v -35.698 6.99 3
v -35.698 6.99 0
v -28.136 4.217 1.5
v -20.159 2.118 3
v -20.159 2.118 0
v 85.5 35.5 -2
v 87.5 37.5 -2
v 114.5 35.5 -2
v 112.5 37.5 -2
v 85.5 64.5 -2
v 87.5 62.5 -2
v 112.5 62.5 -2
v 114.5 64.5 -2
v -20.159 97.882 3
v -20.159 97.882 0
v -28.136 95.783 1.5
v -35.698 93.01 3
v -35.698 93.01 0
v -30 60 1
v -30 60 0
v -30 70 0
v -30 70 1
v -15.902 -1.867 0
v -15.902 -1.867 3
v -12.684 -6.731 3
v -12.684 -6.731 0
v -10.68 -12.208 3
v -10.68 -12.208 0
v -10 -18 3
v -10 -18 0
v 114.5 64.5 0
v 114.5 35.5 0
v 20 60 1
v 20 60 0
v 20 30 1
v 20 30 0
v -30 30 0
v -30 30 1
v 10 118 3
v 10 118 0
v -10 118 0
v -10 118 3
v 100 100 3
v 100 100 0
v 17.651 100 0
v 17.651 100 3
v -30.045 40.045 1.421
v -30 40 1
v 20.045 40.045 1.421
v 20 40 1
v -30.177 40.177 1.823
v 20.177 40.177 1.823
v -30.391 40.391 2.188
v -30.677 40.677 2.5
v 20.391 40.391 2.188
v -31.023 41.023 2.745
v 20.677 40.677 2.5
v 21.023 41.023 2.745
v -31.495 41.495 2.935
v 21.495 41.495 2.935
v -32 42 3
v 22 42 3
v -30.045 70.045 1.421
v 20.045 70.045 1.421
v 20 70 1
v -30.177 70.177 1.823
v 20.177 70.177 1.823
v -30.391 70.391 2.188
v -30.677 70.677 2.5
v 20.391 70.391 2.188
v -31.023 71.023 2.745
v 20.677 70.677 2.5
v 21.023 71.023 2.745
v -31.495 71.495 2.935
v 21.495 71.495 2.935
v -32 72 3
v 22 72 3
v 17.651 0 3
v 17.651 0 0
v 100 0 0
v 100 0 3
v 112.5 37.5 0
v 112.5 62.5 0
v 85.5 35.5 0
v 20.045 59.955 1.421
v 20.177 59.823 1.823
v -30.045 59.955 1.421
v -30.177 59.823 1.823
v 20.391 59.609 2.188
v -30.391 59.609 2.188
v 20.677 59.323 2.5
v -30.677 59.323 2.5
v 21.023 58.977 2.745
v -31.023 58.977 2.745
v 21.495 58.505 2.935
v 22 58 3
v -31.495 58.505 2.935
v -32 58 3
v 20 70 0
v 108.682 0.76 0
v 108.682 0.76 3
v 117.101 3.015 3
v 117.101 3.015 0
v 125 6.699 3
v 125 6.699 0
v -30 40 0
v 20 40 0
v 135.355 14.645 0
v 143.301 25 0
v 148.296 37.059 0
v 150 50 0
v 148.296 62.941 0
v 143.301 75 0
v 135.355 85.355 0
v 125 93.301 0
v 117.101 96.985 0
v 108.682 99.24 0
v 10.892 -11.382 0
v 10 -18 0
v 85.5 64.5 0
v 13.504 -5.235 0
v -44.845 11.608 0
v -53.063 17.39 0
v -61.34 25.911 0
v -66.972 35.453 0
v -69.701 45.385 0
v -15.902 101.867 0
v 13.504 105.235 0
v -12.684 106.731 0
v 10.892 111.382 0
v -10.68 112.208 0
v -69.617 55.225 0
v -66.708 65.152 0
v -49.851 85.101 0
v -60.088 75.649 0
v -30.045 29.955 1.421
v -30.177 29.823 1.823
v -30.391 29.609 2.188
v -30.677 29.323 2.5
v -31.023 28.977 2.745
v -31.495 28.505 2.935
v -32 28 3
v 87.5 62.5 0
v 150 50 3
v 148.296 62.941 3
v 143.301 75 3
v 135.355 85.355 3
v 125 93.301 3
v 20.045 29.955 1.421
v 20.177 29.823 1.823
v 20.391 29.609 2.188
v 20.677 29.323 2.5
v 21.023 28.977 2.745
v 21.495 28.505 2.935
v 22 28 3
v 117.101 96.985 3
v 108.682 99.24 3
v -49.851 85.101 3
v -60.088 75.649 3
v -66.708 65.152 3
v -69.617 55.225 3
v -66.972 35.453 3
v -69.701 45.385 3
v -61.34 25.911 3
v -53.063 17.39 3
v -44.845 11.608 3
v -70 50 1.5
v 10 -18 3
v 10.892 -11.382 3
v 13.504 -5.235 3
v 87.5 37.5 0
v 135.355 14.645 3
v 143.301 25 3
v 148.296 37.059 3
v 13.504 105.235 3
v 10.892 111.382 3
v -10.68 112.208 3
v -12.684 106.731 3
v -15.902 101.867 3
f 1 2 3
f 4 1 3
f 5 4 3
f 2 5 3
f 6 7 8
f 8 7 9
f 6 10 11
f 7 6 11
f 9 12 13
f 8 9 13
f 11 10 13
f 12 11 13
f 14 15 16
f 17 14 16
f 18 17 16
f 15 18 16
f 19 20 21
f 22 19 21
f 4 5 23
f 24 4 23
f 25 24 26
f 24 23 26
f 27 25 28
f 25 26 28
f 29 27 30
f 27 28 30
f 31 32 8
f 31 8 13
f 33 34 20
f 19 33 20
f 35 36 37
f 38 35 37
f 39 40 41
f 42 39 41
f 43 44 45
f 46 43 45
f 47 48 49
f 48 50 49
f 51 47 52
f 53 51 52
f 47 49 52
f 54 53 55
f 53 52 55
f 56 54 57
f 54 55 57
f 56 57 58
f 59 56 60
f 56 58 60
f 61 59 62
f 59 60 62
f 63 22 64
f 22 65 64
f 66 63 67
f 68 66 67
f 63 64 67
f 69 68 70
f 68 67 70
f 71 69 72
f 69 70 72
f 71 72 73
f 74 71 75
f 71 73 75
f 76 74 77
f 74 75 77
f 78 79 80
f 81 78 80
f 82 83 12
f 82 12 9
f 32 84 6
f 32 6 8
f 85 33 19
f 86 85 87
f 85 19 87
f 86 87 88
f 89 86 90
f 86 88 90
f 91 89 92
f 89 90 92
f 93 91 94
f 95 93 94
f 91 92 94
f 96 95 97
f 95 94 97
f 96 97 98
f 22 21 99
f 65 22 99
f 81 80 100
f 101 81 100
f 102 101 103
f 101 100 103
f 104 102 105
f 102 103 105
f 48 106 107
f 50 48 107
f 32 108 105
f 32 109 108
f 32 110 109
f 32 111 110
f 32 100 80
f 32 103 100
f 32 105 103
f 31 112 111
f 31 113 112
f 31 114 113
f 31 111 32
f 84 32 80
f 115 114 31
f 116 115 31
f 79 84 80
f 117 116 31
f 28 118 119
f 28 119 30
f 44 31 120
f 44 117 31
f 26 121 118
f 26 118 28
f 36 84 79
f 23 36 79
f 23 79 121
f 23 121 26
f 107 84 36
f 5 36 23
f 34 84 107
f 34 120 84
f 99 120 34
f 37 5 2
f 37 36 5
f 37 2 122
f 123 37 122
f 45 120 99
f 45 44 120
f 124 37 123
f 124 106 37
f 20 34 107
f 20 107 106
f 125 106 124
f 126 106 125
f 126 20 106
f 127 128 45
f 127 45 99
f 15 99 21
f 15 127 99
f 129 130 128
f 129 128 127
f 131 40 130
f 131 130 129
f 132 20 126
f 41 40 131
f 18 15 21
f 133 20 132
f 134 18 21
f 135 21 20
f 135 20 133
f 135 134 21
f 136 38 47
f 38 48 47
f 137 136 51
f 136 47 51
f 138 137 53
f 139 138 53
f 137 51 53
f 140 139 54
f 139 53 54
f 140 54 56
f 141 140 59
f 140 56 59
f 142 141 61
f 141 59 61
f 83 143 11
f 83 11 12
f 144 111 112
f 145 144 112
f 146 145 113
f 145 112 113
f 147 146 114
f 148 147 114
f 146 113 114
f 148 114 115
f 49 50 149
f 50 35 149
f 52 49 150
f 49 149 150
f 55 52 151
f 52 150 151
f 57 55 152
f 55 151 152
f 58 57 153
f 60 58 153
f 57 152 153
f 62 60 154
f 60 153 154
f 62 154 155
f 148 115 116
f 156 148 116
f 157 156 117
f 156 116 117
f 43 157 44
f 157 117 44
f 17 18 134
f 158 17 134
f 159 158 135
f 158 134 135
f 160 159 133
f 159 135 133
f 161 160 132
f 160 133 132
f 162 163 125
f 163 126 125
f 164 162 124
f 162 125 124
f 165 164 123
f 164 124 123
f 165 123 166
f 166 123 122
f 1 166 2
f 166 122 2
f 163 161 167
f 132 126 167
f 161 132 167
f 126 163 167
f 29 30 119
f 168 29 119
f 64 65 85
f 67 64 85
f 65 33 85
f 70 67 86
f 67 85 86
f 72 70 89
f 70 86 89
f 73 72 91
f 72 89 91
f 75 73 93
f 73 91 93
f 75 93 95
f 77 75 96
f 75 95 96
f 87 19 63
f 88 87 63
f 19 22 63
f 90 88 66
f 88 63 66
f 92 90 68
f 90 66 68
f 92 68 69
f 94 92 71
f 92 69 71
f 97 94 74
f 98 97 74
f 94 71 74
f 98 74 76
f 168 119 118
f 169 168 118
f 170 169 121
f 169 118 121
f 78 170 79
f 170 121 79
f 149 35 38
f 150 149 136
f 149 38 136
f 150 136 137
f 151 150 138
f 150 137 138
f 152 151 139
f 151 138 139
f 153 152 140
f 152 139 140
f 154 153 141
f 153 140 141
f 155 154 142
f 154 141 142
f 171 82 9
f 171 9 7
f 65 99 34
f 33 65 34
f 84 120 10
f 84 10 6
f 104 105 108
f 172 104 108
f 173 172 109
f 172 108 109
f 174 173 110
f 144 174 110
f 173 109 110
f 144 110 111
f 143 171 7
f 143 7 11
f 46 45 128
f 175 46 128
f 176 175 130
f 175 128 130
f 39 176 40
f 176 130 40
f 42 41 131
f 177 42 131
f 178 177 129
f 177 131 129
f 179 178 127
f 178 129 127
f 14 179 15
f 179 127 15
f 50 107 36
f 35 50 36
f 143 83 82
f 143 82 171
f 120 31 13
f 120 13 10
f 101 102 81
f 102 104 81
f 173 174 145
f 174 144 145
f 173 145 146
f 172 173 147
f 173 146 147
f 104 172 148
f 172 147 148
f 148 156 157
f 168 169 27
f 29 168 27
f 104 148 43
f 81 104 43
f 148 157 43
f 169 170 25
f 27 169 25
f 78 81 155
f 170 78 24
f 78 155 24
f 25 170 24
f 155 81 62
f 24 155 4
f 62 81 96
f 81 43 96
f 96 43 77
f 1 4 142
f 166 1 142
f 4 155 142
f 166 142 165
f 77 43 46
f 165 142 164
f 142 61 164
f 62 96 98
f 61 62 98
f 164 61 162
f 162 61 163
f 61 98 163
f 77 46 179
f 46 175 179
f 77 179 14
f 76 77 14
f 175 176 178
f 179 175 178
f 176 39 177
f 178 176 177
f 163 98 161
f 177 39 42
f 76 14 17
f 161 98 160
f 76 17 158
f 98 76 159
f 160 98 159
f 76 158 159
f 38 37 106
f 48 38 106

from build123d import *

# Parameters (mm, degrees)
F1_DEPTH = 3
F2_R     = 2
F3_DEPTH = 2


with BuildPart() as f1:
    # F0 (on Top) → F1 (new body)
    with BuildSketch(Plane.XY):
        with BuildLine():
            add(Edge.make_bspline(
                [(0, 0), (10.2976274735, 0), (20.158993222, 2.1182632902)],
                knots=[1.5707963268, 1.5707963268, 1.5707963268, 1.8629189995, 1.8629189995, 1.8629189995], degree=2, weights=[1, 0.9893519935, 1]))
            Line((0, 0), (17.6506484271, 0))
            ThreePointArc((17.6506484271, 0), (18.8700107709, 1.1003520247), (20.158993222, 2.1182632902))
        make_face()
        with BuildLine():
            add(Edge.make_bspline(
                [(-20.158993222, 2.1182632902), (-10.2976274735, 0), (0, 0)],
                knots=[1.2786736541, 1.2786736541, 1.2786736541, 1.5707963268, 1.5707963268, 1.5707963268], degree=2, weights=[1, 0.9893519935, 1]))
            Line((0, 0), (0, 30))
            Line((0, 30), (-10, 30))
            Line((-10, 30), (-30, 30))
            Line((-30, 30), (-30, 40))
            Line((-30, 40), (-10, 40))
            Line((-10, 40), (0, 40))
            Line((0, 40), (0, 50))
            Line((0, 50), (-70, 50))
            add(Edge.make_bspline(
                [(-70, 50), (-70, 21.516086051), (-35.6976035326, 6.9902650909)],
                knots=[0, 0, 0, 1.0356513364, 1.0356513364, 1.0356513364], degree=2, weights=[1, 0.8688975097, 1]))
            ThreePointArc((-35.6976035326, 6.9902650909), (-27.5204903752, 5.8549142898), (-20.158993222, 2.1182632902))
        make_face()
        with BuildLine():
            Line((0, -18), (0, 0))
            add(Edge.make_bspline(
                [(-20.158993222, 2.1182632902), (-10.2976274735, 0), (0, 0)],
                knots=[1.2786736541, 1.2786736541, 1.2786736541, 1.5707963268, 1.5707963268, 1.5707963268], degree=2, weights=[1, 0.9893519935, 1]))
            ThreePointArc((-20.158993222, 2.1182632902), (-12.6838044298, -6.7311307011), (-10, -18))
            Line((-10, -18), (0, -18))
        make_face()
        with BuildLine():
            Line((0, 30), (0, 0))
            add(Edge.make_bspline(
                [(0, 0), (10.2976274735, 0), (20.158993222, 2.1182632902)],
                knots=[1.5707963268, 1.5707963268, 1.5707963268, 1.8629189995, 1.8629189995, 1.8629189995], degree=2, weights=[1, 0.9893519935, 1]))
            ThreePointArc((20.158993222, 2.1182632902), (27.5204903752, 5.8549142898), (35.6976035326, 6.9902650909))
            add(Edge.make_bspline(
                [(35.6976035326, 6.9902650909), (49.4779363229, 12.8257362969), (58.3333333333, 22.3614600804)],
                knots=[2.1059413172, 2.1059413172, 2.1059413172, 2.5559071101, 2.5559071101, 2.5559071101], degree=2, weights=[1, 0.9747979228, 1]))
            ThreePointArc((58.3333333333, 22.3614600804), (52.1286446122, 35.5662432703), (50, 50))
            Line((50, 50), (0, 50))
            Line((0, 50), (0, 40))
            Line((0, 40), (20, 40))
            Line((20, 40), (20, 30))
            Line((20, 30), (0, 30))
        make_face()
        with BuildLine():
            Line((17.6506484271, 0), (0, 0))
            Line((0, 0), (0, -18))
            Line((0, -18), (10, -18))
            ThreePointArc((10, -18), (11.9920254116, -8.2207819669), (17.6506484271, 0))
        make_face()
        with BuildLine():
            ThreePointArc((20.158993222, 2.1182632902), (18.8700107709, 1.1003520247), (17.6506484271, 0))
            Line((17.6506484271, 0), (52.3493515729, 0))
            ThreePointArc((52.3493515729, 0), (44.67672975, 5.0512668056), (35.6976035326, 6.9902650909))
            add(Edge.make_bspline(
                [(20.158993222, 2.1182632902), (28.3447518468, 3.8765990461), (35.6976035326, 6.9902650909)],
                knots=[1.8629189995, 1.8629189995, 1.8629189995, 2.1059413172, 2.1059413172, 2.1059413172], degree=2, weights=[1, 0.9926265982, 1]))
        make_face()
        with BuildLine():
            add(Edge.make_bspline(
                [(-35.6976035326, 6.9902650909), (-28.3447518468, 3.8765990461), (-20.158993222, 2.1182632902)],
                knots=[1.0356513364, 1.0356513364, 1.0356513364, 1.2786736541, 1.2786736541, 1.2786736541], degree=2, weights=[1, 0.9926265982, 1]))
            ThreePointArc((-20.158993222, 2.1182632902), (-27.5204903752, 5.8549142898), (-35.6976035326, 6.9902650909))
        make_face()
        with BuildLine():
            ThreePointArc((35.6976035326, 6.9902650909), (27.5204903752, 5.8549142898), (20.158993222, 2.1182632902))
            add(Edge.make_bspline(
                [(20.158993222, 2.1182632902), (28.3447518468, 3.8765990461), (35.6976035326, 6.9902650909)],
                knots=[1.8629189995, 1.8629189995, 1.8629189995, 2.1059413172, 2.1059413172, 2.1059413172], degree=2, weights=[1, 0.9926265982, 1]))
        make_face()
        with BuildLine():
            ThreePointArc((35.6976035326, 6.9902650909), (44.67672975, 5.0512668056), (52.3493515729, 0))
            Line((52.3493515729, 0), (100, 0))
            ThreePointArc((100, 0), (76.3560472423, 5.9436327191), (58.3333333333, 22.3614600804))
            add(Edge.make_bspline(
                [(35.6976035326, 6.9902650909), (49.4779363229, 12.8257362969), (58.3333333333, 22.3614600804)],
                knots=[2.1059413172, 2.1059413172, 2.1059413172, 2.5559071101, 2.5559071101, 2.5559071101], degree=2, weights=[1, 0.9747979228, 1]))
        make_face()
        with BuildLine():
            ThreePointArc((58.3333333333, 22.3614600804), (76.3560472423, 5.9436327191), (100, 0))
            ThreePointArc((100, 0), (112.9409522551, 1.7037086855), (125, 6.6987298108))
            ThreePointArc((125, 6.6987298108), (110.8310397827, 18.9227968521), (102.1486677301, 35.5))
            Line((102.1486677301, 35.5), (85.5, 35.5))
            Line((85.5, 35.5), (85.5, 50))
            Line((85.5, 50), (70, 50))
            add(Edge.make_bspline(
                [(58.3333333333, 22.3614600804), (70, 34.9244327711), (70, 50)],
                knots=[2.5559071101, 2.5559071101, 2.5559071101, 3.1415926536, 3.1415926536, 3.1415926536], degree=2, weights=[1, 0.9574271078, 1]))
        make_face()
        with BuildLine():
            add(Edge.make_bspline(
                [(-35.6976035326, 93.0097349091), (-70, 78.483913949), (-70, 50)],
                knots=[5.2475339708, 5.2475339708, 5.2475339708, 6.2831853072, 6.2831853072, 6.2831853072], degree=2, weights=[1, 0.8688975097, 1]))
            Line((-70, 50), (0, 50))
            Line((0, 50), (0, 60))
            Line((0, 60), (-10, 60))
            Line((-10, 60), (-30, 60))
            Line((-30, 60), (-30, 70))
            Line((-30, 70), (-10, 70))
            Line((-10, 70), (0, 70))
            Line((0, 70), (0, 100))
            add(Edge.make_bspline(
                [(0, 100), (-10.2976274735, 100), (-20.158993222, 97.8817367098)],
                knots=[4.7123889804, 4.7123889804, 4.7123889804, 5.0045116531, 5.0045116531, 5.0045116531], degree=2, weights=[1, 0.9893519935, 1]))
            add(Edge.make_bspline(
                [(-20.158993222, 97.8817367098), (-28.3447518468, 96.1234009539), (-35.6976035326, 93.0097349091)],
                knots=[5.0045116531, 5.0045116531, 5.0045116531, 5.2475339708, 5.2475339708, 5.2475339708], degree=2, weights=[1, 0.9926265982, 1]))
        make_face()
        with BuildLine():
            ThreePointArc((50, 50), (52.1286446122, 35.5662432703), (58.3333333333, 22.3614600804))
            add(Edge.make_bspline(
                [(58.3333333333, 22.3614600804), (70, 34.9244327711), (70, 50)],
                knots=[2.5559071101, 2.5559071101, 2.5559071101, 3.1415926536, 3.1415926536, 3.1415926536], degree=2, weights=[1, 0.9574271078, 1]))
            Line((70, 50), (50, 50))
        make_face()
        with BuildLine():
            ThreePointArc((102.1486677301, 35.5), (110.8310397827, 18.9227968521), (125, 6.6987298108))
            ThreePointArc((125, 6.6987298108), (143.3012701892, 25), (150, 50))
            Line((150, 50), (114.5, 50))
            Line((114.5, 50), (114.5, 35.5))
            Line((114.5, 35.5), (102.1486677301, 35.5))
        make_face()
        with BuildLine():
            Line((0, 60), (0, 50))
            Line((0, 50), (50, 50))
            ThreePointArc((50, 50), (52.1286446122, 64.4337567297), (58.3333333333, 77.6385399196))
            add(Edge.make_bspline(
                [(58.3333333333, 77.6385399196), (49.4779363229, 87.1742637031), (35.6976035326, 93.0097349091)],
                knots=[3.727278197, 3.727278197, 3.727278197, 4.17724399, 4.17724399, 4.17724399], degree=2, weights=[1, 0.9747979228, 1]))
            ThreePointArc((35.6976035326, 93.0097349091), (27.5204903752, 94.1450857102), (20.158993222, 97.8817367098))
            add(Edge.make_bspline(
                [(20.158993222, 97.8817367098), (10.2976274735, 100), (0, 100)],
                knots=[4.4202663077, 4.4202663077, 4.4202663077, 4.7123889804, 4.7123889804, 4.7123889804], degree=2, weights=[1, 0.9893519935, 1]))
            Line((0, 100), (0, 70))
            Line((0, 70), (20, 70))
            Line((20, 70), (20, 60))
            Line((20, 60), (0, 60))
        make_face()
        with BuildLine():
            Line((50, 50), (70, 50))
            add(Edge.make_bspline(
                [(70, 50), (70, 65.0755672289), (58.3333333333, 77.6385399196)],
                knots=[3.1415926536, 3.1415926536, 3.1415926536, 3.727278197, 3.727278197, 3.727278197], degree=2, weights=[1, 0.9574271078, 1]))
            ThreePointArc((58.3333333333, 77.6385399196), (52.1286446122, 64.4337567297), (50, 50))
        make_face()
        with BuildLine():
            add(Edge.make_bspline(
                [(70, 50), (70, 65.0755672289), (58.3333333333, 77.6385399196)],
                knots=[3.1415926536, 3.1415926536, 3.1415926536, 3.727278197, 3.727278197, 3.727278197], degree=2, weights=[1, 0.9574271078, 1]))
            Line((70, 50), (85.5, 50))
            Line((85.5, 50), (85.5, 64.5))
            Line((85.5, 64.5), (102.1486677301, 64.5))
            ThreePointArc((102.1486677301, 64.5), (110.8310397827, 81.0772031479), (125, 93.3012701892))
            ThreePointArc((125, 93.3012701892), (112.9409522551, 98.2962913145), (100, 100))
            ThreePointArc((100, 100), (76.3560472423, 94.0563672809), (58.3333333333, 77.6385399196))
        make_face()
        with BuildLine():
            Line((85.5, 35.5), (102.1486677301, 35.5))
            ThreePointArc((102.1486677301, 35.5), (101.8578009321, 36.4970866512), (101.5877081724, 37.5))
            Line((101.5877081724, 37.5), (87.5, 37.5))
            Line((87.5, 37.5), (87.5, 50))
            Line((87.5, 50), (85.5, 50))
            Line((85.5, 50), (85.5, 35.5))
        make_face()
        with BuildLine():
            ThreePointArc((101.5877081724, 37.5), (101.8578009321, 36.4970866512), (102.1486677301, 35.5))
            Line((102.1486677301, 35.5), (114.5, 35.5))
            Line((114.5, 35.5), (114.5, 50))
            Line((114.5, 50), (112.5, 50))
            Line((112.5, 50), (112.5, 37.5))
            Line((112.5, 37.5), (101.5877081724, 37.5))
        make_face()
        with BuildLine():
            Line((114.5, 50), (150, 50))
            ThreePointArc((150, 50), (143.3012701892, 75), (125, 93.3012701892))
            ThreePointArc((125, 93.3012701892), (110.8310397827, 81.0772031479), (102.1486677301, 64.5))
            Line((102.1486677301, 64.5), (114.5, 64.5))
            Line((114.5, 64.5), (114.5, 50))
        make_face()
        with BuildLine():
            ThreePointArc((-10, 118), (-12.6838044298, 106.7311307011), (-20.158993222, 97.8817367098))
            add(Edge.make_bspline(
                [(0, 100), (-10.2976274735, 100), (-20.158993222, 97.8817367098)],
                knots=[4.7123889804, 4.7123889804, 4.7123889804, 5.0045116531, 5.0045116531, 5.0045116531], degree=2, weights=[1, 0.9893519935, 1]))
            Line((0, 100), (0, 118))
            Line((0, 118), (-10, 118))
        make_face()
        with BuildLine():
            add(Edge.make_bspline(
                [(58.3333333333, 77.6385399196), (49.4779363229, 87.1742637031), (35.6976035326, 93.0097349091)],
                knots=[3.727278197, 3.727278197, 3.727278197, 4.17724399, 4.17724399, 4.17724399], degree=2, weights=[1, 0.9747979228, 1]))
            ThreePointArc((58.3333333333, 77.6385399196), (76.3560472423, 94.0563672809), (100, 100))
            Line((100, 100), (52.3493515729, 100))
            ThreePointArc((52.3493515729, 100), (44.67672975, 94.9487331944), (35.6976035326, 93.0097349091))
        make_face()
        with BuildLine():
            Line((85.5, 64.5), (85.5, 50))
            Line((85.5, 50), (87.5, 50))
            Line((87.5, 50), (87.5, 62.5))
            Line((87.5, 62.5), (101.5877081724, 62.5))
            ThreePointArc((101.5877081724, 62.5), (101.8578009321, 63.5029133488), (102.1486677301, 64.5))
            Line((102.1486677301, 64.5), (85.5, 64.5))
        make_face()
        with BuildLine():
            Line((87.5, 37.5), (101.5877081724, 37.5))
            ThreePointArc((101.5877081724, 37.5), (100.3985151866, 43.6997853759), (100, 50))
            Line((100, 50), (87.5, 50))
            Line((87.5, 50), (87.5, 37.5))
        make_face()
        with BuildLine():
            ThreePointArc((100, 50), (100.3985151866, 43.6997853759), (101.5877081724, 37.5))
            Line((101.5877081724, 37.5), (112.5, 37.5))
            Line((112.5, 37.5), (112.5, 50))
            Line((112.5, 50), (100, 50))
        make_face()
        with BuildLine():
            Line((112.5, 50), (114.5, 50))
            Line((114.5, 50), (114.5, 64.5))
            Line((114.5, 64.5), (102.1486677301, 64.5))
            ThreePointArc((102.1486677301, 64.5), (101.8578009321, 63.5029133488), (101.5877081724, 62.5))
            Line((101.5877081724, 62.5), (112.5, 62.5))
            Line((112.5, 62.5), (112.5, 50))
        make_face()
        with BuildLine():
            Line((0, 118), (0, 100))
            Line((0, 100), (17.6506484271, 100))
            ThreePointArc((17.6506484271, 100), (11.9920254116, 108.2207819669), (10, 118))
            Line((10, 118), (0, 118))
        make_face()
        with BuildLine():
            Line((17.6506484271, 100), (0, 100))
            add(Edge.make_bspline(
                [(20.158993222, 97.8817367098), (10.2976274735, 100), (0, 100)],
                knots=[4.4202663077, 4.4202663077, 4.4202663077, 4.7123889804, 4.7123889804, 4.7123889804], degree=2, weights=[1, 0.9893519935, 1]))
            ThreePointArc((20.158993222, 97.8817367098), (18.8700107709, 98.8996479753), (17.6506484271, 100))
        make_face()
        with BuildLine():
            ThreePointArc((20.158993222, 97.8817367098), (27.5204903752, 94.1450857102), (35.6976035326, 93.0097349091))
            add(Edge.make_bspline(
                [(35.6976035326, 93.0097349091), (28.3447518468, 96.1234009539), (20.158993222, 97.8817367098)],
                knots=[4.17724399, 4.17724399, 4.17724399, 4.4202663077, 4.4202663077, 4.4202663077], degree=2, weights=[1, 0.9926265982, 1]))
        make_face()
        with BuildLine():
            add(Edge.make_bspline(
                [(35.6976035326, 93.0097349091), (28.3447518468, 96.1234009539), (20.158993222, 97.8817367098)],
                knots=[4.17724399, 4.17724399, 4.17724399, 4.4202663077, 4.4202663077, 4.4202663077], degree=2, weights=[1, 0.9926265982, 1]))
            ThreePointArc((35.6976035326, 93.0097349091), (44.67672975, 94.9487331944), (52.3493515729, 100))
            Line((52.3493515729, 100), (17.6506484271, 100))
            ThreePointArc((17.6506484271, 100), (18.8700107709, 98.8996479753), (20.158993222, 97.8817367098))
        make_face()
        with BuildLine():
            Line((87.5, 62.5), (87.5, 50))
            Line((87.5, 50), (100, 50))
            ThreePointArc((100, 50), (100.3985151866, 56.3002146241), (101.5877081724, 62.5))
            Line((101.5877081724, 62.5), (87.5, 62.5))
        make_face()
        with BuildLine():
            ThreePointArc((101.5877081724, 62.5), (100.3985151866, 56.3002146241), (100, 50))
            Line((100, 50), (112.5, 50))
            Line((112.5, 50), (112.5, 62.5))
            Line((112.5, 62.5), (101.5877081724, 62.5))
        make_face()
    extrude(amount=F1_DEPTH)

    # F2
    f2_edges = [f1.edges().sort_by_distance(p)[0] for p in [
        (20, 65, 3),
        (20, 35, 3),
        (-5, 40, 3),
        (-5, 60, 3),
        (-5, 30, 3),
        (-30, 35, 3),
        (-30, 65, 3),
        (-5, 70, 3),
    ]]
    fillet(f2_edges, radius=F2_R)

    # F0 (on Top) → F3 (join)
    with BuildSketch(Plane.XY):
        with BuildLine():
            Line((85.5, 35.5), (102.1486677301, 35.5))
            ThreePointArc((102.1486677301, 35.5), (101.8578009321, 36.4970866512), (101.5877081724, 37.5))
            Line((101.5877081724, 37.5), (87.5, 37.5))
            Line((87.5, 37.5), (87.5, 50))
            Line((87.5, 50), (85.5, 50))
            Line((85.5, 50), (85.5, 35.5))
        make_face()
        with BuildLine():
            ThreePointArc((101.5877081724, 37.5), (101.8578009321, 36.4970866512), (102.1486677301, 35.5))
            Line((102.1486677301, 35.5), (114.5, 35.5))
            Line((114.5, 35.5), (114.5, 50))
            Line((114.5, 50), (112.5, 50))
            Line((112.5, 50), (112.5, 37.5))
            Line((112.5, 37.5), (101.5877081724, 37.5))
        make_face()
        with BuildLine():
            Line((112.5, 50), (114.5, 50))
            Line((114.5, 50), (114.5, 64.5))
            Line((114.5, 64.5), (102.1486677301, 64.5))
            ThreePointArc((102.1486677301, 64.5), (101.8578009321, 63.5029133488), (101.5877081724, 62.5))
            Line((101.5877081724, 62.5), (112.5, 62.5))
            Line((112.5, 62.5), (112.5, 50))
        make_face()
        with BuildLine():
            Line((85.5, 64.5), (85.5, 50))
            Line((85.5, 50), (87.5, 50))
            Line((87.5, 50), (87.5, 62.5))
            Line((87.5, 62.5), (101.5877081724, 62.5))
            ThreePointArc((101.5877081724, 62.5), (101.8578009321, 63.5029133488), (102.1486677301, 64.5))
            Line((102.1486677301, 64.5), (85.5, 64.5))
        make_face()
    extrude(amount=-F3_DEPTH)


solid = f1.part
